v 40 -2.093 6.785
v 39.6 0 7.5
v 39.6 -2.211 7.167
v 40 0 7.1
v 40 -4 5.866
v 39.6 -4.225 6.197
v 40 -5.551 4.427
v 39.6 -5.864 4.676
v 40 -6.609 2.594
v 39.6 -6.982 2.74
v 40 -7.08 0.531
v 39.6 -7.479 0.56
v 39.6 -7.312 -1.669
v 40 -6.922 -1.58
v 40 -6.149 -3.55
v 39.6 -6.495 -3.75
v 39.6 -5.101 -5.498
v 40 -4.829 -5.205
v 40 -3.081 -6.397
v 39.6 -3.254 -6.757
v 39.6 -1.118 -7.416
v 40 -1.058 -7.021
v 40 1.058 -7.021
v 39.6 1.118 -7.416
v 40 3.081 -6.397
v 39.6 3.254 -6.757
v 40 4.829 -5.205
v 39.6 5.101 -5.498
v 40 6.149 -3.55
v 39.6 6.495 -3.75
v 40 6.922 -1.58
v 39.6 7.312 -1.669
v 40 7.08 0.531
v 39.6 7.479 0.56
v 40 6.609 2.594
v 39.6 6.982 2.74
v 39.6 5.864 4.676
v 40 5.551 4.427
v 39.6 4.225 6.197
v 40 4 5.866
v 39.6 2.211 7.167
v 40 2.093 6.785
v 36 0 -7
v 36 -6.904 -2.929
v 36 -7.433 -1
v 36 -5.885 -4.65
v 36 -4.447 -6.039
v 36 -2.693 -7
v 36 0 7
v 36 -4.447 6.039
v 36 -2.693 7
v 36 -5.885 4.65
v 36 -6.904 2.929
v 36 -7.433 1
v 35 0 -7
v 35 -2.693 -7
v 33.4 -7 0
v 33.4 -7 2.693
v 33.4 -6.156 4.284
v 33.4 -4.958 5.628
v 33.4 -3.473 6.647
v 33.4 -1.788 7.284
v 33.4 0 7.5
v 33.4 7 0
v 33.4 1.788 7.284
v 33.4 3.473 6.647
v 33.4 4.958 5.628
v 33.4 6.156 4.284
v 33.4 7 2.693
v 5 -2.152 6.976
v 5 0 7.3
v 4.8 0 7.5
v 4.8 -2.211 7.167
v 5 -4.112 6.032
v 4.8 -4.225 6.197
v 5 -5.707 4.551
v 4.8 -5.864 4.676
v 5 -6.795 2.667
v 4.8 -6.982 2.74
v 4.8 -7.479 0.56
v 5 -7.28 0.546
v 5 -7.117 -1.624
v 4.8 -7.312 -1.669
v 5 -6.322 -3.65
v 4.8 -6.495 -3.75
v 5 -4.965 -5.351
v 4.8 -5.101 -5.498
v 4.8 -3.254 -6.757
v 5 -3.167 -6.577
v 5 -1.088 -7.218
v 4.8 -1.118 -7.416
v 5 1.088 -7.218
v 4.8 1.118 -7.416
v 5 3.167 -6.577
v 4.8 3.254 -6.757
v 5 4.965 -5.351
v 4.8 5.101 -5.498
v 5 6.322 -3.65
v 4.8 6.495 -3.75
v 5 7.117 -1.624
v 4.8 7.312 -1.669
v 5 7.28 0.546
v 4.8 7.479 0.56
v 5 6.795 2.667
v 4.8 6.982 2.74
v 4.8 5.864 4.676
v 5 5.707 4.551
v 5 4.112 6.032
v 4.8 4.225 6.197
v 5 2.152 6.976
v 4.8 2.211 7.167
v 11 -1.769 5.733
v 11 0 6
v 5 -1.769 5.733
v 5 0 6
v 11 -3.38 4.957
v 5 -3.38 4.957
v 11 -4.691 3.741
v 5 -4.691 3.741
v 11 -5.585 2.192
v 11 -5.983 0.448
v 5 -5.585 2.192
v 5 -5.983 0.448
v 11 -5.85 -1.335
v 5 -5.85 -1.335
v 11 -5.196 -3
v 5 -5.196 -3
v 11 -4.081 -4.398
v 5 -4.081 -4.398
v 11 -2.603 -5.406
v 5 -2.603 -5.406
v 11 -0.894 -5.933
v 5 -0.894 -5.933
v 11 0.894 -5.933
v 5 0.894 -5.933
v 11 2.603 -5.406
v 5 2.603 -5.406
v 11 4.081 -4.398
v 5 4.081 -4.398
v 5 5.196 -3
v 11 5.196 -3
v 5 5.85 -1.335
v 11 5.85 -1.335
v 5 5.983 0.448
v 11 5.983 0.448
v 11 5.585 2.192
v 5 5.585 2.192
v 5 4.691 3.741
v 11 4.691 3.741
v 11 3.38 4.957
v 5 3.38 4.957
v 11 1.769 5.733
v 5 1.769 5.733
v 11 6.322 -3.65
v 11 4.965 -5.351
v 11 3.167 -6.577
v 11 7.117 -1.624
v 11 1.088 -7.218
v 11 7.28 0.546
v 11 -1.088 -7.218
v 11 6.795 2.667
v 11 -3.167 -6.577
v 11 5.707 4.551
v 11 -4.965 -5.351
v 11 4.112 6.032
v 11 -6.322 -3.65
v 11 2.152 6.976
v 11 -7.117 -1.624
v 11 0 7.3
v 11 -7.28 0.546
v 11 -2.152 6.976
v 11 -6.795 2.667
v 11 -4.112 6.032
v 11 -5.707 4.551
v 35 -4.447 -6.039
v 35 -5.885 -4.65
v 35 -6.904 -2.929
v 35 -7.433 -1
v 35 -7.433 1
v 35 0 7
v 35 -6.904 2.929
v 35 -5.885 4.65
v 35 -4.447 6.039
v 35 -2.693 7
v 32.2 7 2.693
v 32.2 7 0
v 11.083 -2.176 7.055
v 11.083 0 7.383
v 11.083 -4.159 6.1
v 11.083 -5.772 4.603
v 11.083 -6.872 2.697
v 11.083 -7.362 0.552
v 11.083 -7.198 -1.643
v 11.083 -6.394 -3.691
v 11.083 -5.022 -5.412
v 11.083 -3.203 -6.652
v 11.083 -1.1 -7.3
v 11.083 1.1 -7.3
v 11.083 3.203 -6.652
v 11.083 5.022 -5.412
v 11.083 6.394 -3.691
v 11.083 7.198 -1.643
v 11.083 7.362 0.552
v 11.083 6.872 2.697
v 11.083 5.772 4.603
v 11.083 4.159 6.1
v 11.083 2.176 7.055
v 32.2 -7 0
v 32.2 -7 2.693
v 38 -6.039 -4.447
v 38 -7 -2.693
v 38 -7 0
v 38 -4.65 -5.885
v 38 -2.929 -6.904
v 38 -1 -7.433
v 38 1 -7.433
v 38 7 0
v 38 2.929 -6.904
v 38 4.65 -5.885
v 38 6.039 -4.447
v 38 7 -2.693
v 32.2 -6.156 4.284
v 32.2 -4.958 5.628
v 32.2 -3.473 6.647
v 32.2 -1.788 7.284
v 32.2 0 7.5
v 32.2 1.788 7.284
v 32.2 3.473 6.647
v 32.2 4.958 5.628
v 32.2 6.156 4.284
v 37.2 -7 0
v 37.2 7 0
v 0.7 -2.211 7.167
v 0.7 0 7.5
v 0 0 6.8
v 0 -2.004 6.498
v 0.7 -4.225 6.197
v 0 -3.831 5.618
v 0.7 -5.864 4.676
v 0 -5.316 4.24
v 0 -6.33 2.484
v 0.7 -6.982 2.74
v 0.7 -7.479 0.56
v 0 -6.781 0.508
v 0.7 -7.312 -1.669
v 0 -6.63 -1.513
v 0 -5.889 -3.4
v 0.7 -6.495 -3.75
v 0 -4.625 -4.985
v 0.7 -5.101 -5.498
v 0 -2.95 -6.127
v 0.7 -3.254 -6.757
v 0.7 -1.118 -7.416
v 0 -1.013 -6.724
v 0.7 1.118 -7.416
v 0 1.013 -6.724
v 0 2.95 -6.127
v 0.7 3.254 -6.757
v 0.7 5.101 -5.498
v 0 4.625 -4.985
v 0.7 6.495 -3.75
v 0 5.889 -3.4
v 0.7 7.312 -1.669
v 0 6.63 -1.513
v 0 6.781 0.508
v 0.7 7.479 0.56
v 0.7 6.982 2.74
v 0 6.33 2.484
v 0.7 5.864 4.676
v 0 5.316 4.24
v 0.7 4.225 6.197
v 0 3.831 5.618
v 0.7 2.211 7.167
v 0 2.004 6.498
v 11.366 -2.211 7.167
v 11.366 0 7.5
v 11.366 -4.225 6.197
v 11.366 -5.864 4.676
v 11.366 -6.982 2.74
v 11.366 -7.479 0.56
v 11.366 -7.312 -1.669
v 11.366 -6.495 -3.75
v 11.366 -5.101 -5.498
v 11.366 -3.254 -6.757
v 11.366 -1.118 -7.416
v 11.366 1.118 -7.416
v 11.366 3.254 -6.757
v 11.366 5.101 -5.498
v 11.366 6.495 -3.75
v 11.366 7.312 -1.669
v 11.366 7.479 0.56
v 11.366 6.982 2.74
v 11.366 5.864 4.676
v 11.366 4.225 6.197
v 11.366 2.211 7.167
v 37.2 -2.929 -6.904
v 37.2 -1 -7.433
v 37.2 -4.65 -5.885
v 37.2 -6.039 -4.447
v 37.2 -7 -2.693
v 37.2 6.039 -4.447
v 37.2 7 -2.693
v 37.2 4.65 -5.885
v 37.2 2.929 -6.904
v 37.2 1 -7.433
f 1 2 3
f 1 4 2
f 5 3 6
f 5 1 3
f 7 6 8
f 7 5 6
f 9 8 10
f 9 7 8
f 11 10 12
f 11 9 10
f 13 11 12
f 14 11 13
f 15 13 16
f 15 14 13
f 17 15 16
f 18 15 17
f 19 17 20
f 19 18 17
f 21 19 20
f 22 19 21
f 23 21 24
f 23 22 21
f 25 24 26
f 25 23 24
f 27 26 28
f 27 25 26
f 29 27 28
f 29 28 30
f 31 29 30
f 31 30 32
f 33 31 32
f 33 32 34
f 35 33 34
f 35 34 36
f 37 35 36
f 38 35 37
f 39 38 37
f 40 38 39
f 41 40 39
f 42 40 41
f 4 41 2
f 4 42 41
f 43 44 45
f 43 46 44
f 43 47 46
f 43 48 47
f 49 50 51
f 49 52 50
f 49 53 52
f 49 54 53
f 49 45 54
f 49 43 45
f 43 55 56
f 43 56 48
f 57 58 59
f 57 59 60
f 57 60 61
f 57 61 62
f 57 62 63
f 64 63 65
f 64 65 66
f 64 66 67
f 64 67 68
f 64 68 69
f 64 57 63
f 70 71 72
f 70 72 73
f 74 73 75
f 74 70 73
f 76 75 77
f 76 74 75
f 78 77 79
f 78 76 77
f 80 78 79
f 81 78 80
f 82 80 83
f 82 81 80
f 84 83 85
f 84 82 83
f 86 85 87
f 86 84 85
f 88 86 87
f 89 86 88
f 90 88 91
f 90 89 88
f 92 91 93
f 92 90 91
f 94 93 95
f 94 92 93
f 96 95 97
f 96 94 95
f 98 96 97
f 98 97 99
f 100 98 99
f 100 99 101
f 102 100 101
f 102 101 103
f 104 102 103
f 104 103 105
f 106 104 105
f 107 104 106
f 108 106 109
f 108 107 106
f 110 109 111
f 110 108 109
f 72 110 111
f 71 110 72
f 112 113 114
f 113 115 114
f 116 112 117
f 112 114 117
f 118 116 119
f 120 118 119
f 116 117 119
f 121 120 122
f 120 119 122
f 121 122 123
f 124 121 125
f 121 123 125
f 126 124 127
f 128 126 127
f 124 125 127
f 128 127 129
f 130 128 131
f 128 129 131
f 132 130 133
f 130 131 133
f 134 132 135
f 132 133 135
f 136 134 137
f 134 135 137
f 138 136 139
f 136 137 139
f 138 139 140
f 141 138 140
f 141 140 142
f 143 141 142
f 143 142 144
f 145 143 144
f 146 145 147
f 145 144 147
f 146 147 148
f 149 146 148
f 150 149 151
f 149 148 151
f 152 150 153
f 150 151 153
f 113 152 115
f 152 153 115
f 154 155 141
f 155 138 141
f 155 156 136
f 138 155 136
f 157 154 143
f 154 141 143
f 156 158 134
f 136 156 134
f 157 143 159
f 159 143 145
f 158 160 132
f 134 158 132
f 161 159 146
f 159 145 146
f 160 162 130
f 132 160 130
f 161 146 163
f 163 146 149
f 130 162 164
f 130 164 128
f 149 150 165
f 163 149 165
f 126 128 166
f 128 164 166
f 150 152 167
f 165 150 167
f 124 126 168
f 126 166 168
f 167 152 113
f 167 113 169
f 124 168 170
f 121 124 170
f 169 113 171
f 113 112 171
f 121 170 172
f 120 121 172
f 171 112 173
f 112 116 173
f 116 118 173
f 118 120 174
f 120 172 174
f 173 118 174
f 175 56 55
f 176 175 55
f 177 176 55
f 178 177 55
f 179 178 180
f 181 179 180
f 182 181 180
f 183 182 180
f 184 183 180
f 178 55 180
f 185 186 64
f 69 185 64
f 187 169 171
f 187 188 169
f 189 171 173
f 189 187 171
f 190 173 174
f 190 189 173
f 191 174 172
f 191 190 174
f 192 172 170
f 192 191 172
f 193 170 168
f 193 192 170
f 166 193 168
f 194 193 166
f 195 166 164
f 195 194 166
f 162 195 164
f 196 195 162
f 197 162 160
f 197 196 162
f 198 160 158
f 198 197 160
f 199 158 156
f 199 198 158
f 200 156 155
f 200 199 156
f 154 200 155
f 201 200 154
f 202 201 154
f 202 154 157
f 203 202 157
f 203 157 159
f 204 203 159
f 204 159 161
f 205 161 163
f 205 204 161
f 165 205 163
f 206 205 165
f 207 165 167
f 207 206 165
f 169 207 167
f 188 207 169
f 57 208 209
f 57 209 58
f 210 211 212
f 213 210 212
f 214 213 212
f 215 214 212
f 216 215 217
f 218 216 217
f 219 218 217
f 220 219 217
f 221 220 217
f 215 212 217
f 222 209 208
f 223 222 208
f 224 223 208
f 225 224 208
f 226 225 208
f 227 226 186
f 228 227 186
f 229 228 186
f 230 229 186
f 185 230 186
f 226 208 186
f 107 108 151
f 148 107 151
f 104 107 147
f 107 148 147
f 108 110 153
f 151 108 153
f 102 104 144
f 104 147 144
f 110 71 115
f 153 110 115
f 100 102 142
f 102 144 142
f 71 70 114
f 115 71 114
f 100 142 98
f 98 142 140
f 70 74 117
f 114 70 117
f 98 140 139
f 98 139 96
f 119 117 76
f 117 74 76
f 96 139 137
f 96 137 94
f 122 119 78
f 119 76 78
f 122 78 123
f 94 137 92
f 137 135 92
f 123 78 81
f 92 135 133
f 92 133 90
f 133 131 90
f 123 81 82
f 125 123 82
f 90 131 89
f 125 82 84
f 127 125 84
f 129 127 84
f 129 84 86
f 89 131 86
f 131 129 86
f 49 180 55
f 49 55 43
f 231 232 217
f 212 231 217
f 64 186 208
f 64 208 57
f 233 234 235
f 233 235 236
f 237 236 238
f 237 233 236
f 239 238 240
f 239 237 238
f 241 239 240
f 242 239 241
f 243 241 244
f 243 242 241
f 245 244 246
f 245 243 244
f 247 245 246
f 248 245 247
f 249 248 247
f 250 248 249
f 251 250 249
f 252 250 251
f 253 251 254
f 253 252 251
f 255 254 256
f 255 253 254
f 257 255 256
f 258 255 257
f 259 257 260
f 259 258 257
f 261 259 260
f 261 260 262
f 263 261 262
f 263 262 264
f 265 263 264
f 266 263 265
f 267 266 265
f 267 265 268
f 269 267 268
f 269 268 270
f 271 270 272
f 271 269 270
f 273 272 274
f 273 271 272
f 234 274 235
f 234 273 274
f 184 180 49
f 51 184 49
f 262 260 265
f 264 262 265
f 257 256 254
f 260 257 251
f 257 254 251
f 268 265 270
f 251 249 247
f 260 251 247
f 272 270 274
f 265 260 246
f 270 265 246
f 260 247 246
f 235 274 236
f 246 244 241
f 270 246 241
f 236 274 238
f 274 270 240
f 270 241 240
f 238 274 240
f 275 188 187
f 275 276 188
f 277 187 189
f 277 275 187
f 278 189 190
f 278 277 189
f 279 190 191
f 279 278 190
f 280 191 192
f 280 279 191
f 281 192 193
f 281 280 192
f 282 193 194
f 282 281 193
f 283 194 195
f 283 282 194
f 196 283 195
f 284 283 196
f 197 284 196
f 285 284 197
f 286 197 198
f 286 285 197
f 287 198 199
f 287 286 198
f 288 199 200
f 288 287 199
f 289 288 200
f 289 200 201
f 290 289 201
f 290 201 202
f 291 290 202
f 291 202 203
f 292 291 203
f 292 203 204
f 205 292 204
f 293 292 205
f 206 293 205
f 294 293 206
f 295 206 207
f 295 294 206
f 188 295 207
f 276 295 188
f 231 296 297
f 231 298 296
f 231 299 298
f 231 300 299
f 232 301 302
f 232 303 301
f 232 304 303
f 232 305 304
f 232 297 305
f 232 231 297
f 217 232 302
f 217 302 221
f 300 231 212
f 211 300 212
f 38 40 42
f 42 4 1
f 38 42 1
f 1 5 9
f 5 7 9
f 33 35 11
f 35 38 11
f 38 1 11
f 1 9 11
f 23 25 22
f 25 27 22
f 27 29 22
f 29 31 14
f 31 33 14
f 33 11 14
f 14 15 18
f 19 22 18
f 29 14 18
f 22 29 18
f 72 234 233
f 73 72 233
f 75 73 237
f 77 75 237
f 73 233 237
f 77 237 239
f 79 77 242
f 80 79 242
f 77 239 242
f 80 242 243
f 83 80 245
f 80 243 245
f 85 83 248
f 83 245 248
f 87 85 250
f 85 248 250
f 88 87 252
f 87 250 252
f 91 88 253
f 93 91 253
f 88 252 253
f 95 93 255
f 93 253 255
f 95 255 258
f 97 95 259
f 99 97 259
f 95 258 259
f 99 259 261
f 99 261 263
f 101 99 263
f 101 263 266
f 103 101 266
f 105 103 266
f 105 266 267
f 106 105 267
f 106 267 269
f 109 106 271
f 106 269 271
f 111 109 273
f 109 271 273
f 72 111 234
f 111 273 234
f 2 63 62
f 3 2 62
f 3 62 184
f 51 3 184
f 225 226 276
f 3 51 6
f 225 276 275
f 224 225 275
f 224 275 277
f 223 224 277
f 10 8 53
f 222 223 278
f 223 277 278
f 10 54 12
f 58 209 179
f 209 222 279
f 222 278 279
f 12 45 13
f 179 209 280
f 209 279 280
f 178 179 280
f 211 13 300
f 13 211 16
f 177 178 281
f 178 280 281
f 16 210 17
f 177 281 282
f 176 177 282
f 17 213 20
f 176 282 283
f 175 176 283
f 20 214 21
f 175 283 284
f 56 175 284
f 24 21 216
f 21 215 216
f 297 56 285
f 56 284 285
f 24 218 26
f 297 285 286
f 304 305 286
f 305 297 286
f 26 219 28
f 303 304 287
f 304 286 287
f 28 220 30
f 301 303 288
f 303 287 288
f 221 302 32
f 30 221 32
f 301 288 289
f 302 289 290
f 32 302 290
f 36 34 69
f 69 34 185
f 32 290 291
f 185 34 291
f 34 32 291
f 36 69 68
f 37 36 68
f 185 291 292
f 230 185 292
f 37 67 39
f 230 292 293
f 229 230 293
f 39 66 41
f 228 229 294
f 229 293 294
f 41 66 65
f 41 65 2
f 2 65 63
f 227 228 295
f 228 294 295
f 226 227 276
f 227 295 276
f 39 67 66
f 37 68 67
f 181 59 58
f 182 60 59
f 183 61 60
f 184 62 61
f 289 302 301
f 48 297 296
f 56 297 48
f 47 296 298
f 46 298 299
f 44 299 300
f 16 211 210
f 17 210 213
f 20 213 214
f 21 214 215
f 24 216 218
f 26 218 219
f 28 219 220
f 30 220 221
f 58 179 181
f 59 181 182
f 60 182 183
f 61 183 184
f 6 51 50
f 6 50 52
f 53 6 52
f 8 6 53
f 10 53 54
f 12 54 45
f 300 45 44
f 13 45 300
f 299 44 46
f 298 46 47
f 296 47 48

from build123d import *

# Parameters (mm, degrees)
F2_SIZE   = 0.7
F3_SIZE   = 0.2
F4_W      = 1
F4_H      = 14
F6_DEPTH  = 7.5
F7_W      = 1.2
F7_H      = 14
F8_DEPTH  = 7.5
F9_W      = 0.8
F9_H      = 14
F10_DEPTH = 7.5


# Not quite as in the source:
# - a fillet or chamfer that OpenCascade refuses, or shapes differently, is made with other operations: its cross-section is extruded or revolved along the edge and cut away or added


with BuildPart() as f1:
    # F0 (on Front) → F1 (revolve)
    with BuildSketch(Plane.XZ):
        Polygon((0, 7.5), (0, 0), (40, 0), (40, 7.5), (11, 7.5), (11, 6), (5, 6), (5, 7.5), align=None)
    revolve(axis=Axis((20, 0, 0), (1, 0, 0)))

    # F2
    f2_edges = [f1.edges().sort_by_distance(p)[0] for p in [
        (0, 0, -7.5),
    ]]
    chamfer(f2_edges, length=F2_SIZE)

    # F3
    f3_edges = [f1.edges().sort_by_distance(p)[0] for p in [
        (5, 0, -7.5),
        (11, 0, -7.5),
    ]]
    chamfer(f3_edges, length=F3_SIZE)

    # F5: chamfer of 0.4 on 3 edges, made by hand

    # F5_s1 → F5_t2 (revolve, cut)
    with BuildSketch(Plane.XZ):
        Polygon((11.0828427125, 7.3828427125), (11.3656854249, 7.5), (11.2, 7.5), align=None)
    revolve(axis=Axis((11.2, 0, 0), (1, 0, 0)), mode=Mode.SUBTRACT)

    # F5_s3 → F5_t4 (revolve, cut)
    with BuildSketch(Plane.XZ):
        Polygon((39.6, 7.5), (40, 7.1), (40, 7.5), align=None)
    revolve(axis=Axis((40, 0, 0), (1, 0, 0)), mode=Mode.SUBTRACT)

    # F4 (on Front) → F6 (cut)
    with BuildSketch(Plane.XZ):
        with Locations((35.5, 0)):
            Rectangle(F4_W, F4_H)
    extrude(amount=F6_DEPTH, mode=Mode.SUBTRACT)

    # F7 (on Top) → F8 (cut)
    with BuildSketch(Plane.XY):
        with Locations((32.8, 0)):
            Rectangle(F7_W, F7_H)
    extrude(amount=F8_DEPTH, mode=Mode.SUBTRACT)

    # F9 (on Top) → F10 (cut)
    with BuildSketch(Plane.XY):
        with Locations((37.6, 0)):
            Rectangle(F9_W, F9_H)
    extrude(amount=-F10_DEPTH, mode=Mode.SUBTRACT)


solid = f1.part
